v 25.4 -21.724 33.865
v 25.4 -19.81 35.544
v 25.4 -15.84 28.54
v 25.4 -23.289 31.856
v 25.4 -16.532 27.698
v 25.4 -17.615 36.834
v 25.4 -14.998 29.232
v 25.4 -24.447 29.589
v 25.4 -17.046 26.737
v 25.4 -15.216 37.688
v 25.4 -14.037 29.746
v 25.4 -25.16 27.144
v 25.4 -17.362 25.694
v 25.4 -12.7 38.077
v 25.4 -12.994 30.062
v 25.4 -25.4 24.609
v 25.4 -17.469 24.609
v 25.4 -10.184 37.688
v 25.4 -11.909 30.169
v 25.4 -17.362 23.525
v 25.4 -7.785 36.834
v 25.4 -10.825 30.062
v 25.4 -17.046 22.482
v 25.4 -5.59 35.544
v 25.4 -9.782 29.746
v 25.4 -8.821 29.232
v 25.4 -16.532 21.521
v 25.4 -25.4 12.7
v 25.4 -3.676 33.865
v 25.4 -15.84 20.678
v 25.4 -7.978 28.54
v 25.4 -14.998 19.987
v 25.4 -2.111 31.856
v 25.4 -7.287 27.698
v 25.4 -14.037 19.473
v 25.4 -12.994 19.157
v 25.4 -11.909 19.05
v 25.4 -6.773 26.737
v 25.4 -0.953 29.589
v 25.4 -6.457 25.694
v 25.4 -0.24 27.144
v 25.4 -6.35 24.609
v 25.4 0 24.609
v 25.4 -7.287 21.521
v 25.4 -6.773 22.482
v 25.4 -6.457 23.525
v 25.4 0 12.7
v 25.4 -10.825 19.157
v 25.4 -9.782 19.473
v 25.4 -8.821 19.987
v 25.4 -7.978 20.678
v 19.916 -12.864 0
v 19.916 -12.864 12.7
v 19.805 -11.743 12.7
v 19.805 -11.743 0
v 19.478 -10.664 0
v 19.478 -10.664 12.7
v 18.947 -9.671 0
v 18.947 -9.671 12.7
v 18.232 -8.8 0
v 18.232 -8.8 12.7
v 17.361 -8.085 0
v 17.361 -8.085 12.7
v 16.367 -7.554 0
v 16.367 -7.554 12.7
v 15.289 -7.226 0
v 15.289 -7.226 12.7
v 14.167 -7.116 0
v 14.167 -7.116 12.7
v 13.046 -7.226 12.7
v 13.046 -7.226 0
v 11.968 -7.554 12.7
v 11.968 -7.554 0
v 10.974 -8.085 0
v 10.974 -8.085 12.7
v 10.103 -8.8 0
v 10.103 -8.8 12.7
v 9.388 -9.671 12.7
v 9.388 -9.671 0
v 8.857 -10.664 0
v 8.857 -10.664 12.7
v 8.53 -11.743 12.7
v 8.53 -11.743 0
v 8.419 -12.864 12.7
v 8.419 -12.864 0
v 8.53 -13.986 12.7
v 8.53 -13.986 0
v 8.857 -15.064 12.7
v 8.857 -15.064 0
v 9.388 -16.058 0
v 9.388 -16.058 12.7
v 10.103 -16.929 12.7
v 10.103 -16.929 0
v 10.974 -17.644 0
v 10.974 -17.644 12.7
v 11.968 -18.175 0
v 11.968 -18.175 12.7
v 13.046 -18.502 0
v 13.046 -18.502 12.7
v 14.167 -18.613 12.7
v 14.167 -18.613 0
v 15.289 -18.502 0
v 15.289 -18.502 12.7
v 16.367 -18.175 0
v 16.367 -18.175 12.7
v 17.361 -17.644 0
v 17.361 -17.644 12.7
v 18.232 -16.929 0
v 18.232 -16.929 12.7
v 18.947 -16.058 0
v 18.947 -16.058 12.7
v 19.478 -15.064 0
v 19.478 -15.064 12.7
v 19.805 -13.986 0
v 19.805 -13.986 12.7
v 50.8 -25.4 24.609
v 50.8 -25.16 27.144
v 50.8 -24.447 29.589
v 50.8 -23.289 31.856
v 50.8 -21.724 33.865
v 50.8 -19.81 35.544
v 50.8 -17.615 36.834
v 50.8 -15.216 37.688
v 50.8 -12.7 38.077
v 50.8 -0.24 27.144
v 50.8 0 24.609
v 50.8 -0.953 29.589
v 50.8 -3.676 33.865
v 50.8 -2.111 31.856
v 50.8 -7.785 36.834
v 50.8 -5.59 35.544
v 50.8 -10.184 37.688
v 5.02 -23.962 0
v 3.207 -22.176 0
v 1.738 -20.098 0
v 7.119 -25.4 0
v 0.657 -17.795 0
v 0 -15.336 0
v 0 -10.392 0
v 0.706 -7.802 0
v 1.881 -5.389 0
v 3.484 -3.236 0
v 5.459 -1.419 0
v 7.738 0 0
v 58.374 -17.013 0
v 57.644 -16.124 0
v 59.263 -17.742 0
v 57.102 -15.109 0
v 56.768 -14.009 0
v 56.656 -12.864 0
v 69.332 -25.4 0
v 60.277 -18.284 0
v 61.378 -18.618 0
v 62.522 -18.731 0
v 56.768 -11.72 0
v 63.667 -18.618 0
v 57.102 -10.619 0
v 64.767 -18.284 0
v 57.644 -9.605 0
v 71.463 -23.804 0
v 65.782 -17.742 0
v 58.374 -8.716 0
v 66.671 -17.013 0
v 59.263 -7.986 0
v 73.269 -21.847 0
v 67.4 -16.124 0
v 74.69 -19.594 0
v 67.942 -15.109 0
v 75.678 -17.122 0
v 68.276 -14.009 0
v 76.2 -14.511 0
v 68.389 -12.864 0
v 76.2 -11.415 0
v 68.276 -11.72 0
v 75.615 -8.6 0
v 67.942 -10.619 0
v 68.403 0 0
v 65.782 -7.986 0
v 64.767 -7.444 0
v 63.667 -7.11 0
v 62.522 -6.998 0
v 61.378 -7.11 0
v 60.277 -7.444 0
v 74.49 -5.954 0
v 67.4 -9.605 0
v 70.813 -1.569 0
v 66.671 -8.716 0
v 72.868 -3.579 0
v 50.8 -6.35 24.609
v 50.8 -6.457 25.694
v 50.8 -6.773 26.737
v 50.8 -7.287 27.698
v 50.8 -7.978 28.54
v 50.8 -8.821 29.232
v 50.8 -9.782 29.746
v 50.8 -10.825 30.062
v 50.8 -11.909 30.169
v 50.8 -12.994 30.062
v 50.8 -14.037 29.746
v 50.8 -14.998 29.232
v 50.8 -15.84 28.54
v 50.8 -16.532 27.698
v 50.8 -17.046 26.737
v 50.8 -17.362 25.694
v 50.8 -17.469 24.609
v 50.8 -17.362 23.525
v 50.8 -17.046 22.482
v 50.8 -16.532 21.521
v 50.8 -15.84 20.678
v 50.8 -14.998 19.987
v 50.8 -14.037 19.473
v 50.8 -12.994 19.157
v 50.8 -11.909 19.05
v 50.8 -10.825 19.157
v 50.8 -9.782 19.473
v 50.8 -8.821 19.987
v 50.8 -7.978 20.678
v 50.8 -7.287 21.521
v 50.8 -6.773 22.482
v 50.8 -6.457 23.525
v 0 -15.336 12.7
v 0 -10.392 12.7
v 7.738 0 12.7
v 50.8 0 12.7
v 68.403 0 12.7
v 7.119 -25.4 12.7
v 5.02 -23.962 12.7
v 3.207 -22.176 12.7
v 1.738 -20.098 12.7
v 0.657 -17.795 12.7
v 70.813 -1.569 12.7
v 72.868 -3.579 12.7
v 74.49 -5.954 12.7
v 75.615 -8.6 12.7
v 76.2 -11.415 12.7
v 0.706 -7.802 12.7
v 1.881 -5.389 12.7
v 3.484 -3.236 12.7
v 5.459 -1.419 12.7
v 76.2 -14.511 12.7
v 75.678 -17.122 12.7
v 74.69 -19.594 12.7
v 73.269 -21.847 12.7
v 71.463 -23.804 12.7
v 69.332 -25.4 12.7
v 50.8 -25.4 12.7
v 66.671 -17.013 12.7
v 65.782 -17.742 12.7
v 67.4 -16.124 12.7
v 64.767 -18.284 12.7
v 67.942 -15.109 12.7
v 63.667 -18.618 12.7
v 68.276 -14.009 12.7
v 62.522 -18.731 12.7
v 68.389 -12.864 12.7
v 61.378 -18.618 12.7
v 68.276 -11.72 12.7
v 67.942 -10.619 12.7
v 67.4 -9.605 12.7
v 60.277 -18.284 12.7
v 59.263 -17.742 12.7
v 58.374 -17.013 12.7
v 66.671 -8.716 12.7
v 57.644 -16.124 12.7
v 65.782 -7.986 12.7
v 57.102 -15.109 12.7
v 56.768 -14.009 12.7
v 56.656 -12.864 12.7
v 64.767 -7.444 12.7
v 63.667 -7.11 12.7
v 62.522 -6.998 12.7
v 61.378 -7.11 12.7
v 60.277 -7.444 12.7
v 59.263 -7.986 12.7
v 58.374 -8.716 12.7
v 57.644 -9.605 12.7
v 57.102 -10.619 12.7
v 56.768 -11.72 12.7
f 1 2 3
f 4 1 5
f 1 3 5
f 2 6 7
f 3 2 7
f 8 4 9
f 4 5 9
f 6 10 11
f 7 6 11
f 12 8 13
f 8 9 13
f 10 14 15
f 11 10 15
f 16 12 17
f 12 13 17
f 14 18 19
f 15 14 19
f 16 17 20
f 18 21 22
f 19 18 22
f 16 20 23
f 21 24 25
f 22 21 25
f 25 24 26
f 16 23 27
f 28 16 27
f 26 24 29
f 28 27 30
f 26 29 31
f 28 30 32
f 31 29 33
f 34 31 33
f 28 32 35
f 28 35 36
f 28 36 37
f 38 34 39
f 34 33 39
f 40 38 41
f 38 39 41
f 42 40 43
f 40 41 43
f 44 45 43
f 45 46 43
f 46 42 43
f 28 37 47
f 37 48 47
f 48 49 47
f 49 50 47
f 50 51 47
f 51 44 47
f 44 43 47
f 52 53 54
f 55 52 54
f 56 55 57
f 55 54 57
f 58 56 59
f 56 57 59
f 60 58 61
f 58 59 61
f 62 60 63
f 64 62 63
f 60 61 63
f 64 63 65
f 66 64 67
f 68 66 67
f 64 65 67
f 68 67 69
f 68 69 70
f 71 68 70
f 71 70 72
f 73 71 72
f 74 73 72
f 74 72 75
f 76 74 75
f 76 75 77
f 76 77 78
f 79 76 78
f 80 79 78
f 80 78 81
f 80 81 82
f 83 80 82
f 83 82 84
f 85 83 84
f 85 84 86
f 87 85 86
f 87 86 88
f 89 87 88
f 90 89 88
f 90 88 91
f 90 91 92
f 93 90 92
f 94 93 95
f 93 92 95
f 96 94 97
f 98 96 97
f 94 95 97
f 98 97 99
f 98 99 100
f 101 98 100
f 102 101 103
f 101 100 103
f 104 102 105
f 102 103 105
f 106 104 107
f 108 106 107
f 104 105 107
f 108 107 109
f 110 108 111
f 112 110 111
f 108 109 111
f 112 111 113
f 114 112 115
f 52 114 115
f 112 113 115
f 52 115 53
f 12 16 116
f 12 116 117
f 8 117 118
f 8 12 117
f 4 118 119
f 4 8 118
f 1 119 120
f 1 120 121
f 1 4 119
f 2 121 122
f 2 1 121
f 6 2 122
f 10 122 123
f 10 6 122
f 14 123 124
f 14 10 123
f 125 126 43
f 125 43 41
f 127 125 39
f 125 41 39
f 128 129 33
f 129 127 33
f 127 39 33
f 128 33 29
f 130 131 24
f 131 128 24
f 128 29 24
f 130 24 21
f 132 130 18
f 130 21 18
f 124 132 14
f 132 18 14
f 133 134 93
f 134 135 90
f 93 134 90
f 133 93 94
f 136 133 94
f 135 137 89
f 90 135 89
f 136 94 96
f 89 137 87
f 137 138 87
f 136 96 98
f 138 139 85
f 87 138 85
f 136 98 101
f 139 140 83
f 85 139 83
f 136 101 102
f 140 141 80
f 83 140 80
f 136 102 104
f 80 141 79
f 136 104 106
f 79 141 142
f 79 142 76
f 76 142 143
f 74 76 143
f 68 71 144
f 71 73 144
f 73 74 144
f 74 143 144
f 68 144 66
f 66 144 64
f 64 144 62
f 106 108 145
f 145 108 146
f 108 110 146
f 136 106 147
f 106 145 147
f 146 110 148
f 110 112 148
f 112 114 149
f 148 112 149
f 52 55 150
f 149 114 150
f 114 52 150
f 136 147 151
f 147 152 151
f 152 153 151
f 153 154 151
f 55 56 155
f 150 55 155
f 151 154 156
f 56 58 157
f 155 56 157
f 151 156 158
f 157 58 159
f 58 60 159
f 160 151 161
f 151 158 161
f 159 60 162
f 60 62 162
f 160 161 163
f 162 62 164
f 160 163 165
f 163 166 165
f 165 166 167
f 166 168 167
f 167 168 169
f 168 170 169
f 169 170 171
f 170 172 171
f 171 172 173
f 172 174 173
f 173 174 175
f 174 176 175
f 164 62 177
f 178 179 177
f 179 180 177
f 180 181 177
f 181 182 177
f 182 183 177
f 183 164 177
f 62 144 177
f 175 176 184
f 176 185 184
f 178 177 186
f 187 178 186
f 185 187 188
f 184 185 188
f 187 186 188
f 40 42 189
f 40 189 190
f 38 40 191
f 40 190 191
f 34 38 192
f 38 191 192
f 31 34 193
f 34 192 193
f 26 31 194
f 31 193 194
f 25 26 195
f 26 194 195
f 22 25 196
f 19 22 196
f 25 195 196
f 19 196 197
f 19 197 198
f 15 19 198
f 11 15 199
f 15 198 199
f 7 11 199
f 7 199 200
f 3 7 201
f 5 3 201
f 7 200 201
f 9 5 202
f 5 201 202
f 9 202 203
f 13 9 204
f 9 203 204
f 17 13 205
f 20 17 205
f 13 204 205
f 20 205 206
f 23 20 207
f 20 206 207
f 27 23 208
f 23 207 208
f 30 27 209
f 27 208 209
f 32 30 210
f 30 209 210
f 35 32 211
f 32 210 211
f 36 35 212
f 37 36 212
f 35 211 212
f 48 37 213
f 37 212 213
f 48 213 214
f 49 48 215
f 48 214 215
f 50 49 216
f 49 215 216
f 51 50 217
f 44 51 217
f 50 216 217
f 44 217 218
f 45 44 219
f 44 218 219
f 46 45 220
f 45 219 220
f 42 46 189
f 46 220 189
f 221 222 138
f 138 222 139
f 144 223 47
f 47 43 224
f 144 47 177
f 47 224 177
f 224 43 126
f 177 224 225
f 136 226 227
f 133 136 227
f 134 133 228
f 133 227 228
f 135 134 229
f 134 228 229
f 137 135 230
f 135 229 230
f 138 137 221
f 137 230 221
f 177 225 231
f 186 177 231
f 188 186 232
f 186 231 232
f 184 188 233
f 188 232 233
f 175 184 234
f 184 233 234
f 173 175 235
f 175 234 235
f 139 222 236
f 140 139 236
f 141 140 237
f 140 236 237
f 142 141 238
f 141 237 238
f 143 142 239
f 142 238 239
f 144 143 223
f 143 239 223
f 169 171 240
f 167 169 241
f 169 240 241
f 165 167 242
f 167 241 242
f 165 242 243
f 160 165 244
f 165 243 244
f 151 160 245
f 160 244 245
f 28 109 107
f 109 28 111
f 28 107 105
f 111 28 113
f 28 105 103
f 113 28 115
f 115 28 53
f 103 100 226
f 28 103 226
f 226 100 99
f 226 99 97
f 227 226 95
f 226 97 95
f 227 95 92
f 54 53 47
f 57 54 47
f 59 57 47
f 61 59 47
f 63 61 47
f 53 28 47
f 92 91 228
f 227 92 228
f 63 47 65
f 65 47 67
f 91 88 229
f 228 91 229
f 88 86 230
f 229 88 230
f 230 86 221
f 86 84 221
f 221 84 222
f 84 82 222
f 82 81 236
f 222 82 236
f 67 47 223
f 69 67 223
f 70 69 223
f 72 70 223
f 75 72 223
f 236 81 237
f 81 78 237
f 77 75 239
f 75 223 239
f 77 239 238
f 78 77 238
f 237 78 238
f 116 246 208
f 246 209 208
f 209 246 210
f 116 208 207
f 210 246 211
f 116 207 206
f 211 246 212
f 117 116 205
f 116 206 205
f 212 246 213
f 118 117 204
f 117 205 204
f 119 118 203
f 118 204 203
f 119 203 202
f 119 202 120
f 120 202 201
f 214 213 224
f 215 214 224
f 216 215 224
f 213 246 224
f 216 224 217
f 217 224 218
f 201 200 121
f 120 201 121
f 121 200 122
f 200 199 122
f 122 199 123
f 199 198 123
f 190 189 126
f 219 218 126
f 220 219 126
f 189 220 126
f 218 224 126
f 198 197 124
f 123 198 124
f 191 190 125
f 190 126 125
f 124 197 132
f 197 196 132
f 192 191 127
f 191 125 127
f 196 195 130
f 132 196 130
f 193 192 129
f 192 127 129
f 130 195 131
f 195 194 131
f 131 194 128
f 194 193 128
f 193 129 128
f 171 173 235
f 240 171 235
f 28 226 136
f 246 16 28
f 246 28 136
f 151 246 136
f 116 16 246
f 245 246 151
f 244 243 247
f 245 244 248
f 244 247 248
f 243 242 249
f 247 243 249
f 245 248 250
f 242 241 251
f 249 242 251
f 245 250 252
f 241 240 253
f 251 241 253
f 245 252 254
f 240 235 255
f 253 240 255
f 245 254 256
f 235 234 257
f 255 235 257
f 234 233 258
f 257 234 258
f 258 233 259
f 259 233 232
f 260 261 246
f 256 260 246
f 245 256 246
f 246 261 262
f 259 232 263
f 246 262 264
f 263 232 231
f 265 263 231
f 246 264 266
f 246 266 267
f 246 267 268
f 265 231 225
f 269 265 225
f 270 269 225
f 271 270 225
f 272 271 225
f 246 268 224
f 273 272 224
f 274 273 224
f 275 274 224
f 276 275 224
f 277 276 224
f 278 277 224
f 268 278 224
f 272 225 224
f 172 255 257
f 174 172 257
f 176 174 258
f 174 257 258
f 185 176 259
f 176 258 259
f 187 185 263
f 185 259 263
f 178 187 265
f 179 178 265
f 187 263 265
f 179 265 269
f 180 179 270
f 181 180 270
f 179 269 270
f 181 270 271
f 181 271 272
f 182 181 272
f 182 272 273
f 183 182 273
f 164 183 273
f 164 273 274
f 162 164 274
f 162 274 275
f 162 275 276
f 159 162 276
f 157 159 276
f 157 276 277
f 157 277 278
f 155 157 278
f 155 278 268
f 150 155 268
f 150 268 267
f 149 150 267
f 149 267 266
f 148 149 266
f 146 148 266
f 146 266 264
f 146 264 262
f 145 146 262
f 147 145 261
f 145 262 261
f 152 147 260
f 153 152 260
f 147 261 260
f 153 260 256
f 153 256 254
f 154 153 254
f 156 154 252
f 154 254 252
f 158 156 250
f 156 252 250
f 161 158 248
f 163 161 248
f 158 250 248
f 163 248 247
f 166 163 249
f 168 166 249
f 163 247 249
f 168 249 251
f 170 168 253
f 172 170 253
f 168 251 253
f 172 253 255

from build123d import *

# Parameters (mm, degrees)
F1_DEPTH    = 25.4
F3_DEPTH    = 25.4
F5_DEPTH    = 25.4
F6_T1_DEPTH = 92.8531269327
F7_R        = 5.5593746135
F8_DEPTH    = 25.4
F9_R        = 5.8665873172
F10_DEPTH   = 25.4
F9_R_2      = 5.7482740473
F11_DEPTH   = 25.4


# Not quite as in the source:
# - a fillet or chamfer that OpenCascade refuses, or shapes differently, is made with other operations: its cross-section is extruded or revolved along the edge and cut away or added


with BuildPart() as f1:
    # F0 (on Front) → F1 (new body)
    with BuildSketch(Plane.XZ):
        Polygon((25.4, 12.7), (0, 12.7), (0, 0), (76.2, 0), (76.2, 12.7), (50.8, 12.7), (50.8, 38.1), (25.4, 38.1), align=None)
    extrude(amount=F1_DEPTH)

    # F2 (on face) → F3 (cut)
    with BuildSketch(Plane.XY.offset(12.7)):
        with BuildLine():
            ThreePointArc((0, -10.3920384811), (2.632385222, -4.2752682762), (7.7379127033, 0))
            Line((7.7379127033, 0), (0, 0))
            Line((0, 0), (0, -10.3920384811))
        make_face()
        with BuildLine():
            ThreePointArc((7.1188798174, -25.4), (2.4265465189, -21.1696188601), (0, -15.3364389071))
            Line((0, -15.3364389071), (0, -25.4))
            Line((0, -25.4), (7.1188798174, -25.4))
        make_face()
    extrude(amount=-F3_DEPTH, mode=Mode.SUBTRACT)

    # F4 (on face) → F5 (cut)
    with BuildSketch(Plane.XY.offset(12.7)):
        with BuildLine():
            ThreePointArc((68.4031397104, 0), (73.7378443896, -4.7264477616), (76.2, -11.4149582241))
            Line((76.2, -11.4149582241), (76.2, 0))
            Line((76.2, 0), (68.4031397104, 0))
        make_face()
        with BuildLine():
            ThreePointArc((76.2, -14.5105812124), (74.030690178, -20.7530692397), (69.3316906691, -25.4))
            Line((69.3316906691, -25.4), (76.2, -25.4))
            Line((76.2, -25.4), (76.2, -14.5105812124))
        make_face()
    extrude(amount=-F5_DEPTH, mode=Mode.SUBTRACT)

    # F6: fillet of radius 13.4906253865 on 2 edges, made by hand

    # F6_s2 → F6_t1 (cut)
    with BuildSketch(Plane.YZ.offset(-8.3265634664)):
        with BuildLine():
            ThreePointArc((-25.4, 24.6093746135), (-21.4486873067, 34.1486873067), (-11.9093746135, 38.1))
            Line((-11.9093746135, 38.1), (-25.4, 38.1))
            Line((-25.4, 38.1), (-25.4, 24.6093746135))
        make_face()
        with BuildLine():
            ThreePointArc((0, 24.6093746135), (-3.9513126933, 34.1486873067), (-13.4906253865, 38.1))
            Line((-13.4906253865, 38.1), (0, 38.1))
            Line((0, 38.1), (0, 24.6093746135))
        make_face()
    extrude(amount=F6_T1_DEPTH, mode=Mode.SUBTRACT)

    # F7 (on face) → F8 (cut)
    with BuildSketch(Plane.YZ.offset(50.8)):
        with Locations((-11.9093746135, 24.6093746135)):
            Circle(F7_R)
    extrude(amount=-F8_DEPTH, mode=Mode.SUBTRACT)

    # F9 (on face) → F10 (cut)
    with BuildSketch(Plane.XY.offset(12.7)):
        with Locations((62.5223219395, -12.8642386941)):
            Circle(F9_R)
    extrude(amount=-F10_DEPTH, mode=Mode.SUBTRACT)

    # F9 (on face) → F11 (cut)
    with BuildSketch(Plane.XY.offset(12.7)):
        with Locations((14.1673966027, -12.8642386941)):
            Circle(F9_R_2)
    extrude(amount=-F11_DEPTH, mode=Mode.SUBTRACT)


solid = f1.part
